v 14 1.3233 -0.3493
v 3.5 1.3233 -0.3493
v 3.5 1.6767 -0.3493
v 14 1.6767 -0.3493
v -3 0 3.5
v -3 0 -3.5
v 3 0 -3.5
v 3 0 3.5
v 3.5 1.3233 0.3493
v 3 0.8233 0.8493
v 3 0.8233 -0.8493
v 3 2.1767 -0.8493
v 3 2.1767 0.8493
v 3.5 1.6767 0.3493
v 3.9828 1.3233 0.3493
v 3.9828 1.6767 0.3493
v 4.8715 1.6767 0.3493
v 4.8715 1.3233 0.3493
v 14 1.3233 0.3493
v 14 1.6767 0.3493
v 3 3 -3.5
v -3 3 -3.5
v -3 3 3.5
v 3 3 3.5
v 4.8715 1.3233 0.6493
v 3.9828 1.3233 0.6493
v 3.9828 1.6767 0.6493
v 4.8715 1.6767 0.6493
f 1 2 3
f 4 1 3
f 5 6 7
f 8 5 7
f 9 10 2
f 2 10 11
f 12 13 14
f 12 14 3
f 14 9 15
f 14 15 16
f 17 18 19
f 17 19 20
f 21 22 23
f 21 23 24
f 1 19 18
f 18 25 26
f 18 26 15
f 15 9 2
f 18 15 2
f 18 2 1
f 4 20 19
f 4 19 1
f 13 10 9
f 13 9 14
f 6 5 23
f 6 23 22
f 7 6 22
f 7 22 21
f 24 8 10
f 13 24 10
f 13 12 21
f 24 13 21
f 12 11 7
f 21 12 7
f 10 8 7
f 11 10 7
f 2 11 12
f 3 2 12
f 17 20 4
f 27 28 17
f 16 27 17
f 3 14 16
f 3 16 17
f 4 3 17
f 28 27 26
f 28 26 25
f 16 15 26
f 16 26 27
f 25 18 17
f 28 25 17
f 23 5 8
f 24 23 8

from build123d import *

# Parameters (mm, degrees)
SKETCH1_W           = 6
SKETCH1_H           = 7
BOSS_EXTRUDE1_DEPTH = 3
SKETCH5_W           = 0.698626826
SKETCH5_H           = 0.353353156
BOSS_EXTRUDE3_DEPTH = 0.5
DRAFT1_ANGLE        = 45
SKETCH6_W           = 0.698626826
SKETCH6_H           = 0.353353156
BOSS_EXTRUDE4_DEPTH = 10.5
SKETCH9_W           = 0.888706469
SKETCH9_H           = 0.353353156
BOSS_EXTRUDE5_DEPTH = 0.3


with BuildPart() as part:
    # Sketch1 → Boss-Extrude1 (new body)
    with BuildSketch(Plane(origin=(0, 0, 0), x_dir=(1, 0, 0), z_dir=(0, 1, 0))):
        Rectangle(SKETCH1_W, SKETCH1_H)
    extrude(amount=BOSS_EXTRUDE1_DEPTH)

    # Sketch5 → Boss-Extrude3 (add)
    with BuildSketch(Plane(origin=(3, 0, 0), x_dir=(0, 0, -1), z_dir=(1, 0, 0))):
        with Locations((0, 1.5)):
            Rectangle(SKETCH5_W, SKETCH5_H)
    extrude(amount=BOSS_EXTRUDE3_DEPTH)

    # Draft1
    draft1_faces = [part.faces().sort_by_distance(p)[0] for p in [
        (3.25, 1.323323422, 0),
        (3.25, 1.5, 0.349313413),
        (3.25, 1.676676578, 0),
        (3.25, 1.5, -0.349313413),
    ]]
    draft(draft1_faces, Plane(origin=(3.5, 0, 0), x_dir=(0, 0, 1), z_dir=(1, 0, 0)), DRAFT1_ANGLE)

    # Sketch6 → Boss-Extrude4 (add)
    with BuildSketch(Plane(origin=(3.5, 0, 0), x_dir=(0, 0, -1), z_dir=(1, 0, 0))):
        with Locations((0, 1.5)):
            Rectangle(SKETCH6_W, SKETCH6_H)
    extrude(amount=BOSS_EXTRUDE4_DEPTH)

    # Sketch9 → Boss-Extrude5 (add)
    with BuildSketch(Plane.XY.offset(0.349313413)):
        with Locations((4.427106984, 1.5)):
            Rectangle(SKETCH9_W, SKETCH9_H)
    extrude(amount=BOSS_EXTRUDE5_DEPTH)


solid = part.part
